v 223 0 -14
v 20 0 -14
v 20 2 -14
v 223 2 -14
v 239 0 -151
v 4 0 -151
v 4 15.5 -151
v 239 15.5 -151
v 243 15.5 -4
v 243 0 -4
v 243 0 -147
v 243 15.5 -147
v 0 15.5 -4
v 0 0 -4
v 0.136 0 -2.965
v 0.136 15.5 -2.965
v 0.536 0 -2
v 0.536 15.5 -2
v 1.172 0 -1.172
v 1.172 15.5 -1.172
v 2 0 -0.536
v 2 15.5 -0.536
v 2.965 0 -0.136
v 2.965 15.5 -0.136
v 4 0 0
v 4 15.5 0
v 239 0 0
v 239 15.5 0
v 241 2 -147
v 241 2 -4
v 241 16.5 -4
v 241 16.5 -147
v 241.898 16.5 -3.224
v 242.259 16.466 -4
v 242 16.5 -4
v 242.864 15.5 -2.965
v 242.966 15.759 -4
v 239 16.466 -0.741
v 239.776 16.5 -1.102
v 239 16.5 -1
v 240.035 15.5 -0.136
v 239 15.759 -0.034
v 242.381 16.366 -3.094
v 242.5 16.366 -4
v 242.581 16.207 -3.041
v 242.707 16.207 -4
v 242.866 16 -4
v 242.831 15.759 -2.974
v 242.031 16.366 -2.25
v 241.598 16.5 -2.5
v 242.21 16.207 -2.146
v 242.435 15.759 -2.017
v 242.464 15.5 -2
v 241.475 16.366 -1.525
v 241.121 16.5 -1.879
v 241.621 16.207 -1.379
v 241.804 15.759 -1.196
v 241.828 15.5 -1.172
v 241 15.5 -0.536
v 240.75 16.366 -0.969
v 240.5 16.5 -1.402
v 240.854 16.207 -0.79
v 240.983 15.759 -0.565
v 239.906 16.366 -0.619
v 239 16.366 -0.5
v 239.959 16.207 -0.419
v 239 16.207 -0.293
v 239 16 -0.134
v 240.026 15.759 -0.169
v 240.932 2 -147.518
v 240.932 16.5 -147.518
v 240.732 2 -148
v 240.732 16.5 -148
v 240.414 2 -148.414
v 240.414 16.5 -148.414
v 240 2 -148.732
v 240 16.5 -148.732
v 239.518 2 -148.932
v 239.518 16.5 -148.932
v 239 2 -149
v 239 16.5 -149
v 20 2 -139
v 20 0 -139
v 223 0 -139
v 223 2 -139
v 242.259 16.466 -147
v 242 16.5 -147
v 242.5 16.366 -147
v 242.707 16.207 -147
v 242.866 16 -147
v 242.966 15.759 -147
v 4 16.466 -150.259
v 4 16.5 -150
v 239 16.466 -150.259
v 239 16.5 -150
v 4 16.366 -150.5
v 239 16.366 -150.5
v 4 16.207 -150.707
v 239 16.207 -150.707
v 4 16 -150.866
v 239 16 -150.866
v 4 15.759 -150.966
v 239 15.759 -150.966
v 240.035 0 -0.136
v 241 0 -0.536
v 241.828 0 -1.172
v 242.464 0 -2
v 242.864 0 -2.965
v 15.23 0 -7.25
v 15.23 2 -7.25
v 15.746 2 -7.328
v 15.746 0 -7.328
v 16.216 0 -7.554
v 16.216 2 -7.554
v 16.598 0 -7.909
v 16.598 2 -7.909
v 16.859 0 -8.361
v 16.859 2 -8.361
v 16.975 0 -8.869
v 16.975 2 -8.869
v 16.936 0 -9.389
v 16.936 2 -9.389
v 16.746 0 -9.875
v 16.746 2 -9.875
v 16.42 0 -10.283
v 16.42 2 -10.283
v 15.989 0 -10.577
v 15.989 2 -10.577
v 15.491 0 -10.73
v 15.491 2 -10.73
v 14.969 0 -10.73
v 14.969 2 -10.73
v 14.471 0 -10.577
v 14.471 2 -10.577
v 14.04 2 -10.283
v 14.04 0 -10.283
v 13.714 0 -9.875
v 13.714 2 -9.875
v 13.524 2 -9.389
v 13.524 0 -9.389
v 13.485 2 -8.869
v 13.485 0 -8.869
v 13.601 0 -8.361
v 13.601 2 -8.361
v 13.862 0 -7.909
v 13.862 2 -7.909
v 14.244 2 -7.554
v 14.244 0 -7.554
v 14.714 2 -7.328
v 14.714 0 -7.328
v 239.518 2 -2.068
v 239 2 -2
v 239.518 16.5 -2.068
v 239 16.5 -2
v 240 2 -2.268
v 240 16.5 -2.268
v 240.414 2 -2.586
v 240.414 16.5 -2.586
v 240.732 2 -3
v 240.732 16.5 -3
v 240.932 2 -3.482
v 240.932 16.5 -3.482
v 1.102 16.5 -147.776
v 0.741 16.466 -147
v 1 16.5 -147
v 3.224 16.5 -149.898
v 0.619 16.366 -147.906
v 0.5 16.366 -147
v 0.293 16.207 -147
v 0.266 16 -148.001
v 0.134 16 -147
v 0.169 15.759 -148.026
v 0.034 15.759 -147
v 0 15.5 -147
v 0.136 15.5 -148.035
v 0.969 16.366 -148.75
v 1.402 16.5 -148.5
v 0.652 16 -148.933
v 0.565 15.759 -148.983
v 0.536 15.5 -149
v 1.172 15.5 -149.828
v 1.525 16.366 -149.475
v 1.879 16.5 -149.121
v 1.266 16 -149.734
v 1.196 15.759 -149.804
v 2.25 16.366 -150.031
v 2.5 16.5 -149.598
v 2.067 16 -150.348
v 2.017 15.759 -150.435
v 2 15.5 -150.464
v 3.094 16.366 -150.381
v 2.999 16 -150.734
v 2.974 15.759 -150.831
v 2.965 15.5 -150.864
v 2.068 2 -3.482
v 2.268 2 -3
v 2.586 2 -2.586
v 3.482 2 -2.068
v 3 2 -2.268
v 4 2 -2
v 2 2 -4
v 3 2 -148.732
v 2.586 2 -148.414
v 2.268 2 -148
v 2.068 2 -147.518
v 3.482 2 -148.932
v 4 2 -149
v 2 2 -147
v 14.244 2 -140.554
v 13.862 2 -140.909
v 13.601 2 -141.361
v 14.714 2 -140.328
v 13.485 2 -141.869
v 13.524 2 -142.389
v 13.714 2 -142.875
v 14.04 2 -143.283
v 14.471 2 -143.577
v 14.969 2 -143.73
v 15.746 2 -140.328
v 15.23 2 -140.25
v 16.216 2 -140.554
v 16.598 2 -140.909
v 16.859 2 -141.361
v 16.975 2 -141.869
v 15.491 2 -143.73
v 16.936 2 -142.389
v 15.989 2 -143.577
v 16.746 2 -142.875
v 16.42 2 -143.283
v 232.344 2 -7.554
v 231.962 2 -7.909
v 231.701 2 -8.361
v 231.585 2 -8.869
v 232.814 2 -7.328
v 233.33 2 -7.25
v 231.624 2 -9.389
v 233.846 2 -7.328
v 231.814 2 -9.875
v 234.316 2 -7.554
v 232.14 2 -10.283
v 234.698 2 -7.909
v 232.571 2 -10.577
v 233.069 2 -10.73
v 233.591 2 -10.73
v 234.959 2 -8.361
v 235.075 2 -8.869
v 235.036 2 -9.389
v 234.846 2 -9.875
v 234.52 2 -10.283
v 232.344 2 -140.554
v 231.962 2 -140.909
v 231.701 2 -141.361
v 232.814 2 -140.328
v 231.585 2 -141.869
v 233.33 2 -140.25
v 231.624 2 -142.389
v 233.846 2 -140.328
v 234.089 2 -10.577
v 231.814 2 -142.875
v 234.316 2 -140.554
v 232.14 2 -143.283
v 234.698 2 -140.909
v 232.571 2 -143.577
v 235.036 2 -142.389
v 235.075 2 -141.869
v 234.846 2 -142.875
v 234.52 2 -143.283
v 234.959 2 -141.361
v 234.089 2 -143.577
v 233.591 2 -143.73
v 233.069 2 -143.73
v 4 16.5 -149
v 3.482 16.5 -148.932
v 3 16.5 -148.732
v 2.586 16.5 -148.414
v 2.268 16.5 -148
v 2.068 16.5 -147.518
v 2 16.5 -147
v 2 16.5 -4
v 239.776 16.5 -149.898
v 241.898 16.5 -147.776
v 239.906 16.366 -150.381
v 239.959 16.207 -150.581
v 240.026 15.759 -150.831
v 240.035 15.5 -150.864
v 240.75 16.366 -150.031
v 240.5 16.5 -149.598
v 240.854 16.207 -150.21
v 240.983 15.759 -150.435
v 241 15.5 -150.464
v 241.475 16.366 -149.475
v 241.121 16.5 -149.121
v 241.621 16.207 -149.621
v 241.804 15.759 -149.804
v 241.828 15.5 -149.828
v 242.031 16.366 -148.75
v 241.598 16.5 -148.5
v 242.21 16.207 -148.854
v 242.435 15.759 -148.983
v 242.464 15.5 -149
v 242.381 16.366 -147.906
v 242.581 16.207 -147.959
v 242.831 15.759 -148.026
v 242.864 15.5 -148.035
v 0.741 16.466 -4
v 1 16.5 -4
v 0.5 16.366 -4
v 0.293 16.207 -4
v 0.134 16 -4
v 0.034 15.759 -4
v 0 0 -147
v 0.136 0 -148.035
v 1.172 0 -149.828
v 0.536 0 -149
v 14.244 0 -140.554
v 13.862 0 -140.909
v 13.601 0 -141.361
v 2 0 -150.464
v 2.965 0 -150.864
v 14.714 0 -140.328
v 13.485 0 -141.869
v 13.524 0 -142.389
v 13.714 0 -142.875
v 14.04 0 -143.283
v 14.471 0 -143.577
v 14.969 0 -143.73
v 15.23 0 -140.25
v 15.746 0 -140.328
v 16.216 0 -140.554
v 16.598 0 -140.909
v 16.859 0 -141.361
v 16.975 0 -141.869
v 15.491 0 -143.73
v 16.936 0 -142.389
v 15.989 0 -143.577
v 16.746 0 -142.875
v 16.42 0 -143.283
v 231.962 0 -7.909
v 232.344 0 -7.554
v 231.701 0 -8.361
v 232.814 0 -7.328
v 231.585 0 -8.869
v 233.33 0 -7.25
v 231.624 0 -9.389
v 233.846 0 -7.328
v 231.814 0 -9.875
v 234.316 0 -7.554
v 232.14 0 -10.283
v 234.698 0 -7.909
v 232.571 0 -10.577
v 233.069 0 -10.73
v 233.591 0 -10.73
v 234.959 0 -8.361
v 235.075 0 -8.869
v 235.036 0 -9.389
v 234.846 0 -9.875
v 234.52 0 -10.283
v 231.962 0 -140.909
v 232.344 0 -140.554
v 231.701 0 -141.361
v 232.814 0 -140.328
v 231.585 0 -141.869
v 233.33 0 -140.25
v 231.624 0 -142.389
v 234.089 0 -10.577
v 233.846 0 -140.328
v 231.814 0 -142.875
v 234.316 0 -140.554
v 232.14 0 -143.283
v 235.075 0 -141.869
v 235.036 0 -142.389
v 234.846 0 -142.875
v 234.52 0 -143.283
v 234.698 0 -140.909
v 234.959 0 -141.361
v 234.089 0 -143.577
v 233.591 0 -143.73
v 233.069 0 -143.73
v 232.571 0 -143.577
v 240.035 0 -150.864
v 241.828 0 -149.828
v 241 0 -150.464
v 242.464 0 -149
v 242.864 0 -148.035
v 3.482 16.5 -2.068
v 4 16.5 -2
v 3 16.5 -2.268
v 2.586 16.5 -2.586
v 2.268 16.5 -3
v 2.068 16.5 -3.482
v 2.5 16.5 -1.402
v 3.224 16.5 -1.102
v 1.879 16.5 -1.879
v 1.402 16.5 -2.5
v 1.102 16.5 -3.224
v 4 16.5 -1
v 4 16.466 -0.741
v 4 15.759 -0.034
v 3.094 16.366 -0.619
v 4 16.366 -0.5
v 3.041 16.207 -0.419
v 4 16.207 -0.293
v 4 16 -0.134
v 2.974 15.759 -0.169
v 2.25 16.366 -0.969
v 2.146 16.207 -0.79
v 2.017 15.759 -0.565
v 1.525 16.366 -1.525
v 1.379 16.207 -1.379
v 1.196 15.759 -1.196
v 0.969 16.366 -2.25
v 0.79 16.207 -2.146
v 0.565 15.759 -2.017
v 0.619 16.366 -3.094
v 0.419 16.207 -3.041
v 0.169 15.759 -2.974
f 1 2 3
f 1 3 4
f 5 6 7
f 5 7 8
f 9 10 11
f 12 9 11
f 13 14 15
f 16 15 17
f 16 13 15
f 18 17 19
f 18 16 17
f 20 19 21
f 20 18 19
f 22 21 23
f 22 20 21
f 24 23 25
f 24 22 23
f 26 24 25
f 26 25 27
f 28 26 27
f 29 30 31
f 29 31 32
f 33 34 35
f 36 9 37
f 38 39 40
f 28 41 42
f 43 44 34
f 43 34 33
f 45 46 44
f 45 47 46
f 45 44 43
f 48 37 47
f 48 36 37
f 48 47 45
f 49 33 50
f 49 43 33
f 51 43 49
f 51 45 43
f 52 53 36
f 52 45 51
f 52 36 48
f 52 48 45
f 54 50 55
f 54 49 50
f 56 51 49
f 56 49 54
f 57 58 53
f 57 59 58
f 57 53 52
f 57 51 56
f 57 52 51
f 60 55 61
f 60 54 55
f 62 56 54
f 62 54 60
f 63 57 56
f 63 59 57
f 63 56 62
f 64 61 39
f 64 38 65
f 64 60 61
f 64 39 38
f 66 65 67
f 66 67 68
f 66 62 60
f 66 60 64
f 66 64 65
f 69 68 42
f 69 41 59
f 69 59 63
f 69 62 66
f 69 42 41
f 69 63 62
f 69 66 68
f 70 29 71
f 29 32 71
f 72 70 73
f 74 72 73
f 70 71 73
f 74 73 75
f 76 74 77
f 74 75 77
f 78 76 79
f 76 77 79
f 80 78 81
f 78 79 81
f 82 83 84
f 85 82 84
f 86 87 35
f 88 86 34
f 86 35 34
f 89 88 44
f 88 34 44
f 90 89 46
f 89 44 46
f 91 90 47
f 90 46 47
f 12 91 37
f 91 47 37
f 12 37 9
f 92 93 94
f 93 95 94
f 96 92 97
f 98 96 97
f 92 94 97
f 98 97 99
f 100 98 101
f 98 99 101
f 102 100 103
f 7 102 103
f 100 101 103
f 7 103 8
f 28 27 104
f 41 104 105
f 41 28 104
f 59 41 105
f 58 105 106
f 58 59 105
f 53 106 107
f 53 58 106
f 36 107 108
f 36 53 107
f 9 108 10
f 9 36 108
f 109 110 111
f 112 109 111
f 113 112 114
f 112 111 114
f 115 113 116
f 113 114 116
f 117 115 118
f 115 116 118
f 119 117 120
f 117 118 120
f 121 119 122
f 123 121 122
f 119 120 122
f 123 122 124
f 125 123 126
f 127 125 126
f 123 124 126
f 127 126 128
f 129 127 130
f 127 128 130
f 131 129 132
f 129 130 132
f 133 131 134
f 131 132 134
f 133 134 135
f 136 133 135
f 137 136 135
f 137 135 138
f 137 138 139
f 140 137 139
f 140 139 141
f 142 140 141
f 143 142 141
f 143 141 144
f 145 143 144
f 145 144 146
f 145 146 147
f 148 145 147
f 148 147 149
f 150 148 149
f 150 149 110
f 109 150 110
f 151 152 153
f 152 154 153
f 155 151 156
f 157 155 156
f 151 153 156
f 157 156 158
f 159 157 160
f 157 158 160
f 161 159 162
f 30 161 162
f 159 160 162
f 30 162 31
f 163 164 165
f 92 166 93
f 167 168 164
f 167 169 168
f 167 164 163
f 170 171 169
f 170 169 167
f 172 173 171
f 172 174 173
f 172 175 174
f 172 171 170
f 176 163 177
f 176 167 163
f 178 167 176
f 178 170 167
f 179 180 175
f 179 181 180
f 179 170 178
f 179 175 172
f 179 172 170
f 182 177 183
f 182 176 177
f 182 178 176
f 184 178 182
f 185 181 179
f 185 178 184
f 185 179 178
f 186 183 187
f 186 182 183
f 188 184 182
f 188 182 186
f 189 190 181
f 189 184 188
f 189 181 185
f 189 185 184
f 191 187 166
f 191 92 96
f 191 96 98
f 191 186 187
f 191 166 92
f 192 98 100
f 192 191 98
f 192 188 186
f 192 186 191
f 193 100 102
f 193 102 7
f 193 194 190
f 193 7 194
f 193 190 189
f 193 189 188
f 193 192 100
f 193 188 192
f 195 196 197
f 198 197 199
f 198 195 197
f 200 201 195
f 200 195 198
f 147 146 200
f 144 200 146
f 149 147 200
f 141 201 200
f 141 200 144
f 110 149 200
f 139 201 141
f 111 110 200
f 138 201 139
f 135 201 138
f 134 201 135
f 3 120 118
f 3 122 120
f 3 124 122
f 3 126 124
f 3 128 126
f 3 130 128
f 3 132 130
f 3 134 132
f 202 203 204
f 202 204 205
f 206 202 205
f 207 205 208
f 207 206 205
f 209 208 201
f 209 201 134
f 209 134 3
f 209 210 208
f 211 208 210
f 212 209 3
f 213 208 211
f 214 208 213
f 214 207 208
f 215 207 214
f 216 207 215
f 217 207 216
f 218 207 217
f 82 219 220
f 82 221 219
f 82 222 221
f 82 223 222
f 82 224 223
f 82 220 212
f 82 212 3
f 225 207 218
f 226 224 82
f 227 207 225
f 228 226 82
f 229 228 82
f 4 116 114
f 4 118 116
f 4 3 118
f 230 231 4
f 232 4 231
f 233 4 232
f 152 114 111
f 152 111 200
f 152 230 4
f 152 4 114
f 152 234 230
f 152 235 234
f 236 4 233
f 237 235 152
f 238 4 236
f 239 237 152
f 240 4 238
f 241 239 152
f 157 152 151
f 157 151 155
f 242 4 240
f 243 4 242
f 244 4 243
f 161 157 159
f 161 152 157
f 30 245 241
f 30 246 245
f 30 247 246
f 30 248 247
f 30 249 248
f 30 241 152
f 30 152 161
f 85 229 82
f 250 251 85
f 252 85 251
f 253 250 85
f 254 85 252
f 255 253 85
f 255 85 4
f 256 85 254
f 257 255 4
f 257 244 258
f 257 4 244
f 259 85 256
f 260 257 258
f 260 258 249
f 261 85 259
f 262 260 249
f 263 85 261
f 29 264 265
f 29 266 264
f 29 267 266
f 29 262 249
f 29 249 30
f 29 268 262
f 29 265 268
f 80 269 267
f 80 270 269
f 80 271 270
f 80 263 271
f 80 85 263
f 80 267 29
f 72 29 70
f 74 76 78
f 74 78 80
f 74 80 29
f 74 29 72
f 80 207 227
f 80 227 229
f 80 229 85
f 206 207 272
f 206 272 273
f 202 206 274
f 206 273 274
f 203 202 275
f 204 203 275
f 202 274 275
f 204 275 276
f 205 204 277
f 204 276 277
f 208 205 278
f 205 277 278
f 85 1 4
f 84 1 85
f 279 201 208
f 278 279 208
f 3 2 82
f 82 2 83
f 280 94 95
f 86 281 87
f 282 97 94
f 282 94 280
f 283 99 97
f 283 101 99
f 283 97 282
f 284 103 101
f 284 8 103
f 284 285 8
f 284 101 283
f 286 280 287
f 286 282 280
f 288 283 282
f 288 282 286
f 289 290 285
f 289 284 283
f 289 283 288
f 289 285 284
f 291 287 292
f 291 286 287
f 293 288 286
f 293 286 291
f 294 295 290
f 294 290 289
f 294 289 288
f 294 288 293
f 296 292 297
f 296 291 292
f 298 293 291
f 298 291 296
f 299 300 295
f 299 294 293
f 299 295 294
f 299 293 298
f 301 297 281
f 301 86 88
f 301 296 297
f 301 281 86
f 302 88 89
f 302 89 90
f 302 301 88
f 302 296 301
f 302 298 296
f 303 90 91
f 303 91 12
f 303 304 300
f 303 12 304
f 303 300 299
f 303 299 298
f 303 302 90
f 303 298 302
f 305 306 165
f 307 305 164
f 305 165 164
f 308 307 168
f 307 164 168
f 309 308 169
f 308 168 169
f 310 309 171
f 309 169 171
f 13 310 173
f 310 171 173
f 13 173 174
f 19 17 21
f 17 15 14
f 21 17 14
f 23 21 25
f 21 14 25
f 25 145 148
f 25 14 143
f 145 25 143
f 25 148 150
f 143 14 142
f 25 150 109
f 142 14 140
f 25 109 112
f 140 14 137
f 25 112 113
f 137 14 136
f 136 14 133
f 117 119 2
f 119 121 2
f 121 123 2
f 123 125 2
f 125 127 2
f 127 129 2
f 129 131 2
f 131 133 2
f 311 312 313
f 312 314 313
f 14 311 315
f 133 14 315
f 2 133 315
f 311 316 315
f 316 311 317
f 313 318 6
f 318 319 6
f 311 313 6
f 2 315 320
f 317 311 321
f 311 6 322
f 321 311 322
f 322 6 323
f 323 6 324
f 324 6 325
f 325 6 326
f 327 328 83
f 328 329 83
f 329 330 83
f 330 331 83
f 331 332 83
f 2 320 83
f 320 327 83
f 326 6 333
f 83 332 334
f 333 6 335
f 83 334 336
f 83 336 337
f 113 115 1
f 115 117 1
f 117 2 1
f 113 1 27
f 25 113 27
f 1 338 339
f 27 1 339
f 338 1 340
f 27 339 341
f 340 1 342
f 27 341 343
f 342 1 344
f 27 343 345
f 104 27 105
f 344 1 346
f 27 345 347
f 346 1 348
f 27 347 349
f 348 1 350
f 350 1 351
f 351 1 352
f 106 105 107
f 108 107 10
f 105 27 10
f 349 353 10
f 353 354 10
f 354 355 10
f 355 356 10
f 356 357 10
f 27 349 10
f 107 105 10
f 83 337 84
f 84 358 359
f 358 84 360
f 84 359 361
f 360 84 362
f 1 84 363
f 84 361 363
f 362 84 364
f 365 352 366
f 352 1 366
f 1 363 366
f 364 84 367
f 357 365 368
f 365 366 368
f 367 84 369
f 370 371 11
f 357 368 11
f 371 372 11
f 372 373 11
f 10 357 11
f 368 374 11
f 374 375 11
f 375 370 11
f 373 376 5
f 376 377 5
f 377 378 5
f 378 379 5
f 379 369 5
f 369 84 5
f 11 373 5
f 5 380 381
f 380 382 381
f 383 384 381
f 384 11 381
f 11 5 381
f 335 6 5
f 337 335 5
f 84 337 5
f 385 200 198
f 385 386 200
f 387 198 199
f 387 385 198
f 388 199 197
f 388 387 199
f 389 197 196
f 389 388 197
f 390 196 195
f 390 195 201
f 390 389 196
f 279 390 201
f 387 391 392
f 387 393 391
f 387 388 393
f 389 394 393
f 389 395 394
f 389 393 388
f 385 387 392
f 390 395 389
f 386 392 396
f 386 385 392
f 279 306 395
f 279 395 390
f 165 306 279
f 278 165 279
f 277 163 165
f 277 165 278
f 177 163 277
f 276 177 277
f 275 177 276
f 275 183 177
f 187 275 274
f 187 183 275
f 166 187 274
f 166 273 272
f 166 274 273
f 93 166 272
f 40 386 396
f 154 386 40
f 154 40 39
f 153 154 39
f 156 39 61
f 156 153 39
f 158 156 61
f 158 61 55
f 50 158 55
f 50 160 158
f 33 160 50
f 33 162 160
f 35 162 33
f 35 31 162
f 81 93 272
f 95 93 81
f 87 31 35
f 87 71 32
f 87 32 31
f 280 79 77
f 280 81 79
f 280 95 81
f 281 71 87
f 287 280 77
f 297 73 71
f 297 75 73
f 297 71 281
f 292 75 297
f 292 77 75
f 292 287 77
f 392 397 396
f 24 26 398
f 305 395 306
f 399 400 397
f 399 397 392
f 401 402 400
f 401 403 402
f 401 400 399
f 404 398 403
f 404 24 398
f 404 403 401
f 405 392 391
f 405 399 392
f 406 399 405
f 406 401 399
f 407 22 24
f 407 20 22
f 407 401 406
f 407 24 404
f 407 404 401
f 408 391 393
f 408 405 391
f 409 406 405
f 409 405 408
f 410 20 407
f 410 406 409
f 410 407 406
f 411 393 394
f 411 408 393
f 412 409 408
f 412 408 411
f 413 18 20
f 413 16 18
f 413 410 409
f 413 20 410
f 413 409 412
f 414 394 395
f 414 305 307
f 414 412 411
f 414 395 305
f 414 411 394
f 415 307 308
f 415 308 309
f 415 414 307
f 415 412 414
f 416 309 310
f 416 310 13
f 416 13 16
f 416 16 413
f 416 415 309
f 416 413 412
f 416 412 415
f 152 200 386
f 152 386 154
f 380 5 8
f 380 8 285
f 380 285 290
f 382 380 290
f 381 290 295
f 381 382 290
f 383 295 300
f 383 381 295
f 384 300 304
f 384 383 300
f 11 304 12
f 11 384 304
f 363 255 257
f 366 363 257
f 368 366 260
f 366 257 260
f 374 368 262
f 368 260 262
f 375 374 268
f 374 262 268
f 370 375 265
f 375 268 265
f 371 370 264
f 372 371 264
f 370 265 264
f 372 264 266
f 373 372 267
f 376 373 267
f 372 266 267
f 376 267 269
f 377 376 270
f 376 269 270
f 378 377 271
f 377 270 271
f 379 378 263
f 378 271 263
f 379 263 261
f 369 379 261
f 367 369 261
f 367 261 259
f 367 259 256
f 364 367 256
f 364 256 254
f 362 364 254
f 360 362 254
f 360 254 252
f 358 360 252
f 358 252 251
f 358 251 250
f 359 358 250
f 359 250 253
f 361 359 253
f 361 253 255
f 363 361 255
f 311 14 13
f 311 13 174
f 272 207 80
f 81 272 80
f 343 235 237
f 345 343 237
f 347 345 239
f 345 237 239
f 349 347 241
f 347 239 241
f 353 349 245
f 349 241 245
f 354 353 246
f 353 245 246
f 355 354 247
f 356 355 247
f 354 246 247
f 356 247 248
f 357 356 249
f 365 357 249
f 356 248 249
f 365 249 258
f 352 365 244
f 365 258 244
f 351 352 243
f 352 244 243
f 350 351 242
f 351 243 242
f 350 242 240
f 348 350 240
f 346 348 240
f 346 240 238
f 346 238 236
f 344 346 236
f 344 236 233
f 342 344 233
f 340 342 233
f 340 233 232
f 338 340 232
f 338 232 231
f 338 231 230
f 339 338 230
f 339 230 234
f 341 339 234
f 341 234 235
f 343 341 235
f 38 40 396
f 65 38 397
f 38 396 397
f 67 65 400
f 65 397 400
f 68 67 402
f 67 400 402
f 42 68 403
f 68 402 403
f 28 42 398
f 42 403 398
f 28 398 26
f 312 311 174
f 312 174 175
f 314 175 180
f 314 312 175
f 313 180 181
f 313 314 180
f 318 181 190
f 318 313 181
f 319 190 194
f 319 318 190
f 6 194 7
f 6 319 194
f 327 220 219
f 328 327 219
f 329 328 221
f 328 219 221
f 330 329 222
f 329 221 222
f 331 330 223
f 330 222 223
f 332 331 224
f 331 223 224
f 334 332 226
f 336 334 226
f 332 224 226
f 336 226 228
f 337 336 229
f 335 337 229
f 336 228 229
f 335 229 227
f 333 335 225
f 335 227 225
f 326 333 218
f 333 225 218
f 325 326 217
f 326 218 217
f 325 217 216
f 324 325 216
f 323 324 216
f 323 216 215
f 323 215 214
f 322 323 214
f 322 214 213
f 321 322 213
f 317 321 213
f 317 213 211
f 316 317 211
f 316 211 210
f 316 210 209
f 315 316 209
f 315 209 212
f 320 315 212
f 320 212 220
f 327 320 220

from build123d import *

# Parameters (mm, degrees)
SKIZZE1_W                       = 243
SKIZZE1_H                       = 151
SKIZZE1_W_2                     = 203
SKIZZE1_H_2                     = 125
AUFSATZ_LINEAR_AUSTRAGEN1_DEPTH = 2
SKIZZE2_W                       = 243
SKIZZE2_H                       = 151
SKIZZE2_W_2                     = 239
SKIZZE2_H_2                     = 147
AUFSATZ_LINEAR_AUSTRAGEN2_DEPTH = 14.5
SKIZZE3_R                       = 1.75
SCHNITT_LINEAR_AUSTRAGEN1_DEPTH = 287.461603012
VERRUNDUNG1_R                   = 2
VERRUNDUNG2_R                   = 4
VERRUNDUNG3_R                   = 1


with BuildPart() as part:
    # Skizze1 → Aufsatz-Linear austragen1 (new body)
    with BuildSketch(Plane(origin=(0, 0, 0), x_dir=(1, 0, 0), z_dir=(0, 1, 0))):
        with Locations((121.5, 75.5)):
            Rectangle(SKIZZE1_W, SKIZZE1_H)
        with Locations((121.5, 76.5)):
            Rectangle(SKIZZE1_W_2, SKIZZE1_H_2, mode=Mode.SUBTRACT)
    extrude(amount=AUFSATZ_LINEAR_AUSTRAGEN1_DEPTH)

    # Skizze2 → Aufsatz-Linear austragen2 (add)
    with BuildSketch(Plane(origin=(0, 2, 0), x_dir=(1, 0, 0), z_dir=(0, 1, 0))):
        with Locations((121.5, 75.5)):
            Rectangle(SKIZZE2_W, SKIZZE2_H)
        with Locations((121.5, 75.5)):
            Rectangle(SKIZZE2_W_2, SKIZZE2_H_2, mode=Mode.SUBTRACT)
    extrude(amount=AUFSATZ_LINEAR_AUSTRAGEN2_DEPTH)

    # Skizze3 → Schnitt-Linear austragen1 (cut, through all)
    with BuildSketch(Plane(origin=(0, 2, 0), x_dir=(1, 0, 0), z_dir=(0, 1, 0))):
        with Locations(Location((15.23, 142, 0), (0, 0, 270))):
            Circle(SKIZZE3_R)
        with Locations(Location((233.33, 142, 0), (0, 0, 270))):
            Circle(SKIZZE3_R)
        with Locations(Location((15.23, 9, 0), (0, 0, 270))):
            Circle(SKIZZE3_R)
        with Locations(Location((233.33, 9, 0), (0, 0, 270))):
            Circle(SKIZZE3_R)
    extrude(amount=-SCHNITT_LINEAR_AUSTRAGEN1_DEPTH, mode=Mode.SUBTRACT)

    # Verrundung1
    verrundung1_edges = [part.edges().sort_by_distance(p)[0] for p in [
        (2, 9.25, -2),
        (241, 9.25, -2),
        (241, 9.25, -149),
        (2, 9.25, -149),
    ]]
    fillet(verrundung1_edges, radius=VERRUNDUNG1_R)

    # Verrundung2
    verrundung2_edges = [part.edges().sort_by_distance(p)[0] for p in [
        (0, 8.25, -151),
        (243, 8.25, -151),
        (243, 8.25, 0),
        (0, 8.25, 0),
    ]]
    fillet(verrundung2_edges, radius=VERRUNDUNG2_R)

    # Verrundung3
    verrundung3_edges = [part.edges().sort_by_distance(p)[0] for p in [
        (121.5, 16.5, -151),
        (121.5, 16.5, 0),
        (243, 16.5, -75.5),
        (1.171572875, 16.5, -1.171572875),
        (241.828427125, 16.5, -1.171572875),
        (241.828427125, 16.5, -149.828427125),
        (1.171572875, 16.5, -149.828427125),
        (0, 16.5, -75.5),
    ]]
    fillet(verrundung3_edges, radius=VERRUNDUNG3_R)


solid = part.part
